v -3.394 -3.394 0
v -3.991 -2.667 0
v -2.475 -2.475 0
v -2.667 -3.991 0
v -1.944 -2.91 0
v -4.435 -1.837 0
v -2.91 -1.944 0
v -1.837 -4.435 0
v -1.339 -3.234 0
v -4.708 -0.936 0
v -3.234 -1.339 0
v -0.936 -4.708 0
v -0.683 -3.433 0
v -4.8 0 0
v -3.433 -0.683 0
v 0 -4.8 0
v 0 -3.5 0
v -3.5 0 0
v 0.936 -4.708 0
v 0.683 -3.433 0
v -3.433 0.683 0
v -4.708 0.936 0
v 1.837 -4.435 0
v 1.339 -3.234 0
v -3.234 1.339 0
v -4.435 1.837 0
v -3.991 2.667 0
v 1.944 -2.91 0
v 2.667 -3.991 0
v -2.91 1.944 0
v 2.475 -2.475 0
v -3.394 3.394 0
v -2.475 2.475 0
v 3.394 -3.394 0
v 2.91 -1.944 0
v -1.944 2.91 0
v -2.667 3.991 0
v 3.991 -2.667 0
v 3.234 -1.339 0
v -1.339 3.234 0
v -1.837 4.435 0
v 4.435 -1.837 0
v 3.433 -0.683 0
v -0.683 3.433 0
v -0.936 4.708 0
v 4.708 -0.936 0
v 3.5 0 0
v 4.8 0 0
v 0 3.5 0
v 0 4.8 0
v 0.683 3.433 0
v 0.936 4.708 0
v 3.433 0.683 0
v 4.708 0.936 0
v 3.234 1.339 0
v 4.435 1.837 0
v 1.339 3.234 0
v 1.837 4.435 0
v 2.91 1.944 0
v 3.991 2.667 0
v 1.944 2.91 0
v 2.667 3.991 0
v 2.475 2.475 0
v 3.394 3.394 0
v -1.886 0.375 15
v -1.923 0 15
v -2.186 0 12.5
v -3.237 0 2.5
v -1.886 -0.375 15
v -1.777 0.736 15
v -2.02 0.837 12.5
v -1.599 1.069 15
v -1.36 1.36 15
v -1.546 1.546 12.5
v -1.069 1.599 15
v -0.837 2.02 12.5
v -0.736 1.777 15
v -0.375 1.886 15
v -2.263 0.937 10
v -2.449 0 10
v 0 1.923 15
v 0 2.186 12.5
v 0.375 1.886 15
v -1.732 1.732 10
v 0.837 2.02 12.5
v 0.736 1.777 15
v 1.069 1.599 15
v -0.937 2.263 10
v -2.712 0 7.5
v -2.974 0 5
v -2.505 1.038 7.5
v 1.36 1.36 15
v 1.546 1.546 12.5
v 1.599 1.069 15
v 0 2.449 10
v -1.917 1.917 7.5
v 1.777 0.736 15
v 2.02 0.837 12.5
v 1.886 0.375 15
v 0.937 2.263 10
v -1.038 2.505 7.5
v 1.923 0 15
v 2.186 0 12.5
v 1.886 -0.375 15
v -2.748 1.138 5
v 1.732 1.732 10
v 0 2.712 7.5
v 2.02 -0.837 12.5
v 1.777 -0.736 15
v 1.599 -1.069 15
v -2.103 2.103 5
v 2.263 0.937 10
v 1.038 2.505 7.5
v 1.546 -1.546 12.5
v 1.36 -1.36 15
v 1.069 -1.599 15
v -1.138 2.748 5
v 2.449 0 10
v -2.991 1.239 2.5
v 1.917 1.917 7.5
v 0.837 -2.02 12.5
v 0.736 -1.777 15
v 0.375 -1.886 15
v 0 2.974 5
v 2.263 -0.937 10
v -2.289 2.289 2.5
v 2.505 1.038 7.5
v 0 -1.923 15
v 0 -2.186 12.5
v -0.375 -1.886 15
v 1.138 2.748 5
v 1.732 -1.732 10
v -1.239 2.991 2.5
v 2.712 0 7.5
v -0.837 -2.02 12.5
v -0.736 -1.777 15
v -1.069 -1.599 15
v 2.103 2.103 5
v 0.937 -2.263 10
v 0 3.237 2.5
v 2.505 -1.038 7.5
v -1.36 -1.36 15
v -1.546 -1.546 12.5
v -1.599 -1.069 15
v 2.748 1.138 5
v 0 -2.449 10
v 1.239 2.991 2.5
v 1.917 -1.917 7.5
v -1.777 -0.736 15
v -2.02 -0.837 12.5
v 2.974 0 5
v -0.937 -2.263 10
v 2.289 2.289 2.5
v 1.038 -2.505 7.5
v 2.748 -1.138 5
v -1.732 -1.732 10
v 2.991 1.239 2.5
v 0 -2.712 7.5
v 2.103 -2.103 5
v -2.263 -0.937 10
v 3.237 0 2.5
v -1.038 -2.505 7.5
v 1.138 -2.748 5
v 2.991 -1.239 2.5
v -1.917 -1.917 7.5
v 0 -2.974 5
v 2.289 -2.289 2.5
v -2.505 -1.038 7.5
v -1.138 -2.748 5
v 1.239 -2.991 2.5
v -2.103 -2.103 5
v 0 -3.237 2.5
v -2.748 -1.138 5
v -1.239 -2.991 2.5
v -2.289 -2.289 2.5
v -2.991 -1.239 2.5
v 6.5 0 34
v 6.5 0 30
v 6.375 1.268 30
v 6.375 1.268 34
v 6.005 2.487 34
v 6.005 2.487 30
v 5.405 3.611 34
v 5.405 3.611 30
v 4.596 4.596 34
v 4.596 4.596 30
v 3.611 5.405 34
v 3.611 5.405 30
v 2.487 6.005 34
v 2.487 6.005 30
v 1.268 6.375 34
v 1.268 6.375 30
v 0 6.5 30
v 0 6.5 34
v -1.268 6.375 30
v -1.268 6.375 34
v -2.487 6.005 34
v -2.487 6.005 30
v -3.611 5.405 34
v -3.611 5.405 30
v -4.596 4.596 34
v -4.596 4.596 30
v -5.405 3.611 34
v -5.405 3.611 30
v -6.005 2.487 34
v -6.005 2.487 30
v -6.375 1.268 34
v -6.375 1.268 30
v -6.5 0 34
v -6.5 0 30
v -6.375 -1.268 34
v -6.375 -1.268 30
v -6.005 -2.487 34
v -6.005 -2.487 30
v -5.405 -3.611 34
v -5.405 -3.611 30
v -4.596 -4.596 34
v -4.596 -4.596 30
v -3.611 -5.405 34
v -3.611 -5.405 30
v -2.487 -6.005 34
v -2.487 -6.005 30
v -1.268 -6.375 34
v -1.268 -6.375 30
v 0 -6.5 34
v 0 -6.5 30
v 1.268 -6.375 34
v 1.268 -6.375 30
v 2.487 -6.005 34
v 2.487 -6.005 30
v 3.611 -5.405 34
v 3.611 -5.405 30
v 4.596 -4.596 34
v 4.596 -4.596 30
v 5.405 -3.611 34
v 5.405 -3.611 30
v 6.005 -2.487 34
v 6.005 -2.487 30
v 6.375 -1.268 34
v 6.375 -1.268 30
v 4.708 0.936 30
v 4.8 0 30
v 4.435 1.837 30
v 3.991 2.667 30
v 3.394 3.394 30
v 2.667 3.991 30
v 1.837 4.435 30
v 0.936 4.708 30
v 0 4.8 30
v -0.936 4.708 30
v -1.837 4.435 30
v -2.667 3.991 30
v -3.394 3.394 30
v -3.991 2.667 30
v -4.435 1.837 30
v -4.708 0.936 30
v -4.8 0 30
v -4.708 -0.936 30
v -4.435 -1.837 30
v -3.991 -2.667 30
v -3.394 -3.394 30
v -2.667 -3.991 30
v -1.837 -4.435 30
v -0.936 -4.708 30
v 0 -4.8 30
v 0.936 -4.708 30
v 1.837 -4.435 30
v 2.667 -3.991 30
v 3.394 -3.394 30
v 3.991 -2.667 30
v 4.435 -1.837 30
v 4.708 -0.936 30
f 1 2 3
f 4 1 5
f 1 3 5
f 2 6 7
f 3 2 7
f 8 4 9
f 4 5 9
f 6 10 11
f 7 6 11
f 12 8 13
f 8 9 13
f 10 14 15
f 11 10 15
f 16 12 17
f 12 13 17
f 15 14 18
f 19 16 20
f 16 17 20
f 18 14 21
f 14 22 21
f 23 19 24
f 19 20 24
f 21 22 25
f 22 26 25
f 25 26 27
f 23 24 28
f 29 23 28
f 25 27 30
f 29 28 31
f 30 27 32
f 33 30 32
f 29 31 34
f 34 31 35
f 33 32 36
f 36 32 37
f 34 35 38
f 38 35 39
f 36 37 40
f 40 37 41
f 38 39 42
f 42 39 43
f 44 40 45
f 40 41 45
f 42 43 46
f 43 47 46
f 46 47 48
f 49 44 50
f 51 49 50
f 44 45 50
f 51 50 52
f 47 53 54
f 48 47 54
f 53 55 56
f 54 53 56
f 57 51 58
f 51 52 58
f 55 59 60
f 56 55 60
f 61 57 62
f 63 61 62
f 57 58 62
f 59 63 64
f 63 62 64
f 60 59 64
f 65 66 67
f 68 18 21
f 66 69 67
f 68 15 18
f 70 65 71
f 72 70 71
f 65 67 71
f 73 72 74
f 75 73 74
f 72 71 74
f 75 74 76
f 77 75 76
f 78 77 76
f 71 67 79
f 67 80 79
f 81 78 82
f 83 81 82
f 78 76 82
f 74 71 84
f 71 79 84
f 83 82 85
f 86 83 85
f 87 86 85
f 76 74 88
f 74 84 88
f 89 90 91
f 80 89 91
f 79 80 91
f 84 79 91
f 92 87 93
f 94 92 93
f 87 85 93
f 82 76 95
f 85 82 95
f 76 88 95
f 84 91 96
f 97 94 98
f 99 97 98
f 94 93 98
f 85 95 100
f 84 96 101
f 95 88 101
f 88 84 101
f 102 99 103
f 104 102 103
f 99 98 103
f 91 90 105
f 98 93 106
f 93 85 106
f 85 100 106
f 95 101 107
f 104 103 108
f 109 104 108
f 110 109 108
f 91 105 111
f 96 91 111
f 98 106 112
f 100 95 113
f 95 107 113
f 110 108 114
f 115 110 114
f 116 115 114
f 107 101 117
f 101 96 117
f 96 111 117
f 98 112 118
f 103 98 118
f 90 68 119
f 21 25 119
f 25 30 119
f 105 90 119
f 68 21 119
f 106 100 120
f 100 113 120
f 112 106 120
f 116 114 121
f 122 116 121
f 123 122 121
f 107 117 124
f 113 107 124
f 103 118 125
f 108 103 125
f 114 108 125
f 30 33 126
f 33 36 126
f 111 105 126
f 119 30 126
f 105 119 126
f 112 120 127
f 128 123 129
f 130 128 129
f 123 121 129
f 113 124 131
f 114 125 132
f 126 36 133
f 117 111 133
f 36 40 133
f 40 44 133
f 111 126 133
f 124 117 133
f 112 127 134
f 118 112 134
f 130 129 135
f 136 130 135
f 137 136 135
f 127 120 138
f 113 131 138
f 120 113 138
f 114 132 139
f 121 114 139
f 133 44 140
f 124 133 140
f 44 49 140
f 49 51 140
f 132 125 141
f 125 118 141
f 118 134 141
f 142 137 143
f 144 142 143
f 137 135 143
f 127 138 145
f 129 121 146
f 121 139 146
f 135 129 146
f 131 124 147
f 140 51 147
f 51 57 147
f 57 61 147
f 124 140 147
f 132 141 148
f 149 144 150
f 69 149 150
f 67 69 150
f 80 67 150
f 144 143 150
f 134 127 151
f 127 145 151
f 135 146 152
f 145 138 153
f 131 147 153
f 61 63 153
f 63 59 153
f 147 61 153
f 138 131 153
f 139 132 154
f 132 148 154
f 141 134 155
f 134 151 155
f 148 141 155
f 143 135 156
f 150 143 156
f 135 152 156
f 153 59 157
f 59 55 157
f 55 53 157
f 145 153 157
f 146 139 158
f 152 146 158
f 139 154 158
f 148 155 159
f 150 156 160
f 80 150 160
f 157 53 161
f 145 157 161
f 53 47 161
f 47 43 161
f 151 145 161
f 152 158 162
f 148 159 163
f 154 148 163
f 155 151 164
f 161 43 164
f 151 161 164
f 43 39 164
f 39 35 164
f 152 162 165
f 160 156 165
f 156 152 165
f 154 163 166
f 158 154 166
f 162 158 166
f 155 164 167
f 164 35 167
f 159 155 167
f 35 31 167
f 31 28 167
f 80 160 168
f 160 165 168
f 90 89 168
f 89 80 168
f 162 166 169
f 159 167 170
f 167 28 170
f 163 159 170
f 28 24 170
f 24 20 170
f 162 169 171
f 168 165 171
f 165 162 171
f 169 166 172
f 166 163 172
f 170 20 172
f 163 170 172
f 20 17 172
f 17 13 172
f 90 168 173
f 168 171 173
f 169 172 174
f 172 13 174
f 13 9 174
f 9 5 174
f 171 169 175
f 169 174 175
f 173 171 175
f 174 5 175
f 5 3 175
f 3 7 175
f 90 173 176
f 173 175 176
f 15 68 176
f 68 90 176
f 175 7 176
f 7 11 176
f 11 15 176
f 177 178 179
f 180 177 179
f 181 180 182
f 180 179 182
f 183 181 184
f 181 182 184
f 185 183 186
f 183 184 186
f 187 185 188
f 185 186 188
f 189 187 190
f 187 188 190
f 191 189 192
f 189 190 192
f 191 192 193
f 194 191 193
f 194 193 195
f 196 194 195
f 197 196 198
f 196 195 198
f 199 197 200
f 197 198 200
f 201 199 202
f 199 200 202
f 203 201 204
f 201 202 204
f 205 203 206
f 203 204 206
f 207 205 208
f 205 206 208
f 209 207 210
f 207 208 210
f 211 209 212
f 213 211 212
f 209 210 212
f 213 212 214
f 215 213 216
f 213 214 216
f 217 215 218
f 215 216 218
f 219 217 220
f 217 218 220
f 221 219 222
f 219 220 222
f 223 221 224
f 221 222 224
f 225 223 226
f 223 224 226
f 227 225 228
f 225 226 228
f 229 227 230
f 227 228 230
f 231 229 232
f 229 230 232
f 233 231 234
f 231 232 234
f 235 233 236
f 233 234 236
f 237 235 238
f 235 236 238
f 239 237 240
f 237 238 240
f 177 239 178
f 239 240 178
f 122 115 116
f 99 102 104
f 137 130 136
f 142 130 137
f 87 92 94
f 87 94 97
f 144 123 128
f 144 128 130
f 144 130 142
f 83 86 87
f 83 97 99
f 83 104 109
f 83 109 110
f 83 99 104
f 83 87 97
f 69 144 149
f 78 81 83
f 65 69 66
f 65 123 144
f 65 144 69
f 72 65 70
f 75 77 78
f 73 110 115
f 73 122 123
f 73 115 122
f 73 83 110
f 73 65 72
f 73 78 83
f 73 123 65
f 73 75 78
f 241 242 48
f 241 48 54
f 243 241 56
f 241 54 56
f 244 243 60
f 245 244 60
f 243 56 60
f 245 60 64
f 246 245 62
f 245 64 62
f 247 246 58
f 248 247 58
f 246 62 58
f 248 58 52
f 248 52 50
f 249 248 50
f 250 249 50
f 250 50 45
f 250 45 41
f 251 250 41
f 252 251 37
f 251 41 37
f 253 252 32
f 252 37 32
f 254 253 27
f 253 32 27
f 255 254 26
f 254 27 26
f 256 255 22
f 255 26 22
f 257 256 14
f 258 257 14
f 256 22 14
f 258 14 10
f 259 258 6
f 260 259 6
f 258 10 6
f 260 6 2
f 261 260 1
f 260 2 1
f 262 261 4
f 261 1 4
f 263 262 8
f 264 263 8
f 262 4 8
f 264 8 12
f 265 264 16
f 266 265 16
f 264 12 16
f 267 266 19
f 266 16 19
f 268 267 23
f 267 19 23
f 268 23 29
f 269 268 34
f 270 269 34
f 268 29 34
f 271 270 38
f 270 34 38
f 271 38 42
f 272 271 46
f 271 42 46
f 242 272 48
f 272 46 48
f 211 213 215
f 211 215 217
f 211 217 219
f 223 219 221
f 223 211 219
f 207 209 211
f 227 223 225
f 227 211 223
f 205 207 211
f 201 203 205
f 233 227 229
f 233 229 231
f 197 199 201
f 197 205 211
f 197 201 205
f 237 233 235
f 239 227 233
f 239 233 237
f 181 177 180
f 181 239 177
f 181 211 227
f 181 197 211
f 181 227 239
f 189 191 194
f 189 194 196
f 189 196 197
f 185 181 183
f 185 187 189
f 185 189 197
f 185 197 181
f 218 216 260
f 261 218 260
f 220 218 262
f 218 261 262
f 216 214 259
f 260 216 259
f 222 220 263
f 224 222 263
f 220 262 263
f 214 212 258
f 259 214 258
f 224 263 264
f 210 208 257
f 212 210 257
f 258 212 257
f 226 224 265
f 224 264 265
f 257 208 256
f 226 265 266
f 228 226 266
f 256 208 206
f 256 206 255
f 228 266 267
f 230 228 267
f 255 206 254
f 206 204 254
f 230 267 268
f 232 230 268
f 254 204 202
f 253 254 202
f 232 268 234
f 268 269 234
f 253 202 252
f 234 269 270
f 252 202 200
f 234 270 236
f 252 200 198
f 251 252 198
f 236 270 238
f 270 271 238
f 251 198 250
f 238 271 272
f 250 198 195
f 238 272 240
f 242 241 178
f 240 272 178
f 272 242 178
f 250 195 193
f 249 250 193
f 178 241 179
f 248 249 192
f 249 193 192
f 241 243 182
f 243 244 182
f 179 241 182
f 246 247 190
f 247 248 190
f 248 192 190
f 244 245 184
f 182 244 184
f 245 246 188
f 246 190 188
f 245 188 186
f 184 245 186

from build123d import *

# Parameters (mm, degrees)
SKETCH1_R           = 4.8
BOSS_EXTRUDE1_DEPTH = 30
SKETCH2_R           = 6.5
BOSS_EXTRUDE2_DEPTH = 4
SKETCH3_R           = 3.5
CUT_EXTRUDE1_DEPTH  = 15
CUT_EXTRUDE1_DRAFT  = -6


with BuildPart() as part:
    # Sketch1 → Boss-Extrude1 (new body)
    with BuildSketch(Plane.XY):
        Circle(SKETCH1_R)
    extrude(amount=BOSS_EXTRUDE1_DEPTH)

    # Sketch2 → Boss-Extrude2 (add)
    with BuildSketch(Plane.XY.offset(30)):
        Circle(SKETCH2_R)
    extrude(amount=BOSS_EXTRUDE2_DEPTH)


with BuildPart() as cut_extrude1_tool:
    # Sketch3 → Cut-Extrude1 (with draft: the straight prism first)
    with BuildSketch(Plane(origin=(0, 0, 0), x_dir=(-1, 0, 0), z_dir=(0, 0, -1))):
        Circle(SKETCH3_R)
    extrude(amount=-CUT_EXTRUDE1_DEPTH)
    # Cut-Extrude1: the draft: its side faces are tilted about the plane it starts from
    cut_extrude1_sides = [cut_extrude1_tool.faces().sort_by_distance(p)[0] for p in [
        (3.5, 0, 7.5),
    ]]
    draft(cut_extrude1_sides, Plane(origin=(0, 0, 0), x_dir=(-1, 0, 0), z_dir=(0, 0, -1)), CUT_EXTRUDE1_DRAFT)


with BuildPart() as part_1:
    add(part.part)

    # Cut-Extrude1: cut by cut_extrude1_tool
    add(cut_extrude1_tool.part, mode=Mode.SUBTRACT)


solid = part_1.part
